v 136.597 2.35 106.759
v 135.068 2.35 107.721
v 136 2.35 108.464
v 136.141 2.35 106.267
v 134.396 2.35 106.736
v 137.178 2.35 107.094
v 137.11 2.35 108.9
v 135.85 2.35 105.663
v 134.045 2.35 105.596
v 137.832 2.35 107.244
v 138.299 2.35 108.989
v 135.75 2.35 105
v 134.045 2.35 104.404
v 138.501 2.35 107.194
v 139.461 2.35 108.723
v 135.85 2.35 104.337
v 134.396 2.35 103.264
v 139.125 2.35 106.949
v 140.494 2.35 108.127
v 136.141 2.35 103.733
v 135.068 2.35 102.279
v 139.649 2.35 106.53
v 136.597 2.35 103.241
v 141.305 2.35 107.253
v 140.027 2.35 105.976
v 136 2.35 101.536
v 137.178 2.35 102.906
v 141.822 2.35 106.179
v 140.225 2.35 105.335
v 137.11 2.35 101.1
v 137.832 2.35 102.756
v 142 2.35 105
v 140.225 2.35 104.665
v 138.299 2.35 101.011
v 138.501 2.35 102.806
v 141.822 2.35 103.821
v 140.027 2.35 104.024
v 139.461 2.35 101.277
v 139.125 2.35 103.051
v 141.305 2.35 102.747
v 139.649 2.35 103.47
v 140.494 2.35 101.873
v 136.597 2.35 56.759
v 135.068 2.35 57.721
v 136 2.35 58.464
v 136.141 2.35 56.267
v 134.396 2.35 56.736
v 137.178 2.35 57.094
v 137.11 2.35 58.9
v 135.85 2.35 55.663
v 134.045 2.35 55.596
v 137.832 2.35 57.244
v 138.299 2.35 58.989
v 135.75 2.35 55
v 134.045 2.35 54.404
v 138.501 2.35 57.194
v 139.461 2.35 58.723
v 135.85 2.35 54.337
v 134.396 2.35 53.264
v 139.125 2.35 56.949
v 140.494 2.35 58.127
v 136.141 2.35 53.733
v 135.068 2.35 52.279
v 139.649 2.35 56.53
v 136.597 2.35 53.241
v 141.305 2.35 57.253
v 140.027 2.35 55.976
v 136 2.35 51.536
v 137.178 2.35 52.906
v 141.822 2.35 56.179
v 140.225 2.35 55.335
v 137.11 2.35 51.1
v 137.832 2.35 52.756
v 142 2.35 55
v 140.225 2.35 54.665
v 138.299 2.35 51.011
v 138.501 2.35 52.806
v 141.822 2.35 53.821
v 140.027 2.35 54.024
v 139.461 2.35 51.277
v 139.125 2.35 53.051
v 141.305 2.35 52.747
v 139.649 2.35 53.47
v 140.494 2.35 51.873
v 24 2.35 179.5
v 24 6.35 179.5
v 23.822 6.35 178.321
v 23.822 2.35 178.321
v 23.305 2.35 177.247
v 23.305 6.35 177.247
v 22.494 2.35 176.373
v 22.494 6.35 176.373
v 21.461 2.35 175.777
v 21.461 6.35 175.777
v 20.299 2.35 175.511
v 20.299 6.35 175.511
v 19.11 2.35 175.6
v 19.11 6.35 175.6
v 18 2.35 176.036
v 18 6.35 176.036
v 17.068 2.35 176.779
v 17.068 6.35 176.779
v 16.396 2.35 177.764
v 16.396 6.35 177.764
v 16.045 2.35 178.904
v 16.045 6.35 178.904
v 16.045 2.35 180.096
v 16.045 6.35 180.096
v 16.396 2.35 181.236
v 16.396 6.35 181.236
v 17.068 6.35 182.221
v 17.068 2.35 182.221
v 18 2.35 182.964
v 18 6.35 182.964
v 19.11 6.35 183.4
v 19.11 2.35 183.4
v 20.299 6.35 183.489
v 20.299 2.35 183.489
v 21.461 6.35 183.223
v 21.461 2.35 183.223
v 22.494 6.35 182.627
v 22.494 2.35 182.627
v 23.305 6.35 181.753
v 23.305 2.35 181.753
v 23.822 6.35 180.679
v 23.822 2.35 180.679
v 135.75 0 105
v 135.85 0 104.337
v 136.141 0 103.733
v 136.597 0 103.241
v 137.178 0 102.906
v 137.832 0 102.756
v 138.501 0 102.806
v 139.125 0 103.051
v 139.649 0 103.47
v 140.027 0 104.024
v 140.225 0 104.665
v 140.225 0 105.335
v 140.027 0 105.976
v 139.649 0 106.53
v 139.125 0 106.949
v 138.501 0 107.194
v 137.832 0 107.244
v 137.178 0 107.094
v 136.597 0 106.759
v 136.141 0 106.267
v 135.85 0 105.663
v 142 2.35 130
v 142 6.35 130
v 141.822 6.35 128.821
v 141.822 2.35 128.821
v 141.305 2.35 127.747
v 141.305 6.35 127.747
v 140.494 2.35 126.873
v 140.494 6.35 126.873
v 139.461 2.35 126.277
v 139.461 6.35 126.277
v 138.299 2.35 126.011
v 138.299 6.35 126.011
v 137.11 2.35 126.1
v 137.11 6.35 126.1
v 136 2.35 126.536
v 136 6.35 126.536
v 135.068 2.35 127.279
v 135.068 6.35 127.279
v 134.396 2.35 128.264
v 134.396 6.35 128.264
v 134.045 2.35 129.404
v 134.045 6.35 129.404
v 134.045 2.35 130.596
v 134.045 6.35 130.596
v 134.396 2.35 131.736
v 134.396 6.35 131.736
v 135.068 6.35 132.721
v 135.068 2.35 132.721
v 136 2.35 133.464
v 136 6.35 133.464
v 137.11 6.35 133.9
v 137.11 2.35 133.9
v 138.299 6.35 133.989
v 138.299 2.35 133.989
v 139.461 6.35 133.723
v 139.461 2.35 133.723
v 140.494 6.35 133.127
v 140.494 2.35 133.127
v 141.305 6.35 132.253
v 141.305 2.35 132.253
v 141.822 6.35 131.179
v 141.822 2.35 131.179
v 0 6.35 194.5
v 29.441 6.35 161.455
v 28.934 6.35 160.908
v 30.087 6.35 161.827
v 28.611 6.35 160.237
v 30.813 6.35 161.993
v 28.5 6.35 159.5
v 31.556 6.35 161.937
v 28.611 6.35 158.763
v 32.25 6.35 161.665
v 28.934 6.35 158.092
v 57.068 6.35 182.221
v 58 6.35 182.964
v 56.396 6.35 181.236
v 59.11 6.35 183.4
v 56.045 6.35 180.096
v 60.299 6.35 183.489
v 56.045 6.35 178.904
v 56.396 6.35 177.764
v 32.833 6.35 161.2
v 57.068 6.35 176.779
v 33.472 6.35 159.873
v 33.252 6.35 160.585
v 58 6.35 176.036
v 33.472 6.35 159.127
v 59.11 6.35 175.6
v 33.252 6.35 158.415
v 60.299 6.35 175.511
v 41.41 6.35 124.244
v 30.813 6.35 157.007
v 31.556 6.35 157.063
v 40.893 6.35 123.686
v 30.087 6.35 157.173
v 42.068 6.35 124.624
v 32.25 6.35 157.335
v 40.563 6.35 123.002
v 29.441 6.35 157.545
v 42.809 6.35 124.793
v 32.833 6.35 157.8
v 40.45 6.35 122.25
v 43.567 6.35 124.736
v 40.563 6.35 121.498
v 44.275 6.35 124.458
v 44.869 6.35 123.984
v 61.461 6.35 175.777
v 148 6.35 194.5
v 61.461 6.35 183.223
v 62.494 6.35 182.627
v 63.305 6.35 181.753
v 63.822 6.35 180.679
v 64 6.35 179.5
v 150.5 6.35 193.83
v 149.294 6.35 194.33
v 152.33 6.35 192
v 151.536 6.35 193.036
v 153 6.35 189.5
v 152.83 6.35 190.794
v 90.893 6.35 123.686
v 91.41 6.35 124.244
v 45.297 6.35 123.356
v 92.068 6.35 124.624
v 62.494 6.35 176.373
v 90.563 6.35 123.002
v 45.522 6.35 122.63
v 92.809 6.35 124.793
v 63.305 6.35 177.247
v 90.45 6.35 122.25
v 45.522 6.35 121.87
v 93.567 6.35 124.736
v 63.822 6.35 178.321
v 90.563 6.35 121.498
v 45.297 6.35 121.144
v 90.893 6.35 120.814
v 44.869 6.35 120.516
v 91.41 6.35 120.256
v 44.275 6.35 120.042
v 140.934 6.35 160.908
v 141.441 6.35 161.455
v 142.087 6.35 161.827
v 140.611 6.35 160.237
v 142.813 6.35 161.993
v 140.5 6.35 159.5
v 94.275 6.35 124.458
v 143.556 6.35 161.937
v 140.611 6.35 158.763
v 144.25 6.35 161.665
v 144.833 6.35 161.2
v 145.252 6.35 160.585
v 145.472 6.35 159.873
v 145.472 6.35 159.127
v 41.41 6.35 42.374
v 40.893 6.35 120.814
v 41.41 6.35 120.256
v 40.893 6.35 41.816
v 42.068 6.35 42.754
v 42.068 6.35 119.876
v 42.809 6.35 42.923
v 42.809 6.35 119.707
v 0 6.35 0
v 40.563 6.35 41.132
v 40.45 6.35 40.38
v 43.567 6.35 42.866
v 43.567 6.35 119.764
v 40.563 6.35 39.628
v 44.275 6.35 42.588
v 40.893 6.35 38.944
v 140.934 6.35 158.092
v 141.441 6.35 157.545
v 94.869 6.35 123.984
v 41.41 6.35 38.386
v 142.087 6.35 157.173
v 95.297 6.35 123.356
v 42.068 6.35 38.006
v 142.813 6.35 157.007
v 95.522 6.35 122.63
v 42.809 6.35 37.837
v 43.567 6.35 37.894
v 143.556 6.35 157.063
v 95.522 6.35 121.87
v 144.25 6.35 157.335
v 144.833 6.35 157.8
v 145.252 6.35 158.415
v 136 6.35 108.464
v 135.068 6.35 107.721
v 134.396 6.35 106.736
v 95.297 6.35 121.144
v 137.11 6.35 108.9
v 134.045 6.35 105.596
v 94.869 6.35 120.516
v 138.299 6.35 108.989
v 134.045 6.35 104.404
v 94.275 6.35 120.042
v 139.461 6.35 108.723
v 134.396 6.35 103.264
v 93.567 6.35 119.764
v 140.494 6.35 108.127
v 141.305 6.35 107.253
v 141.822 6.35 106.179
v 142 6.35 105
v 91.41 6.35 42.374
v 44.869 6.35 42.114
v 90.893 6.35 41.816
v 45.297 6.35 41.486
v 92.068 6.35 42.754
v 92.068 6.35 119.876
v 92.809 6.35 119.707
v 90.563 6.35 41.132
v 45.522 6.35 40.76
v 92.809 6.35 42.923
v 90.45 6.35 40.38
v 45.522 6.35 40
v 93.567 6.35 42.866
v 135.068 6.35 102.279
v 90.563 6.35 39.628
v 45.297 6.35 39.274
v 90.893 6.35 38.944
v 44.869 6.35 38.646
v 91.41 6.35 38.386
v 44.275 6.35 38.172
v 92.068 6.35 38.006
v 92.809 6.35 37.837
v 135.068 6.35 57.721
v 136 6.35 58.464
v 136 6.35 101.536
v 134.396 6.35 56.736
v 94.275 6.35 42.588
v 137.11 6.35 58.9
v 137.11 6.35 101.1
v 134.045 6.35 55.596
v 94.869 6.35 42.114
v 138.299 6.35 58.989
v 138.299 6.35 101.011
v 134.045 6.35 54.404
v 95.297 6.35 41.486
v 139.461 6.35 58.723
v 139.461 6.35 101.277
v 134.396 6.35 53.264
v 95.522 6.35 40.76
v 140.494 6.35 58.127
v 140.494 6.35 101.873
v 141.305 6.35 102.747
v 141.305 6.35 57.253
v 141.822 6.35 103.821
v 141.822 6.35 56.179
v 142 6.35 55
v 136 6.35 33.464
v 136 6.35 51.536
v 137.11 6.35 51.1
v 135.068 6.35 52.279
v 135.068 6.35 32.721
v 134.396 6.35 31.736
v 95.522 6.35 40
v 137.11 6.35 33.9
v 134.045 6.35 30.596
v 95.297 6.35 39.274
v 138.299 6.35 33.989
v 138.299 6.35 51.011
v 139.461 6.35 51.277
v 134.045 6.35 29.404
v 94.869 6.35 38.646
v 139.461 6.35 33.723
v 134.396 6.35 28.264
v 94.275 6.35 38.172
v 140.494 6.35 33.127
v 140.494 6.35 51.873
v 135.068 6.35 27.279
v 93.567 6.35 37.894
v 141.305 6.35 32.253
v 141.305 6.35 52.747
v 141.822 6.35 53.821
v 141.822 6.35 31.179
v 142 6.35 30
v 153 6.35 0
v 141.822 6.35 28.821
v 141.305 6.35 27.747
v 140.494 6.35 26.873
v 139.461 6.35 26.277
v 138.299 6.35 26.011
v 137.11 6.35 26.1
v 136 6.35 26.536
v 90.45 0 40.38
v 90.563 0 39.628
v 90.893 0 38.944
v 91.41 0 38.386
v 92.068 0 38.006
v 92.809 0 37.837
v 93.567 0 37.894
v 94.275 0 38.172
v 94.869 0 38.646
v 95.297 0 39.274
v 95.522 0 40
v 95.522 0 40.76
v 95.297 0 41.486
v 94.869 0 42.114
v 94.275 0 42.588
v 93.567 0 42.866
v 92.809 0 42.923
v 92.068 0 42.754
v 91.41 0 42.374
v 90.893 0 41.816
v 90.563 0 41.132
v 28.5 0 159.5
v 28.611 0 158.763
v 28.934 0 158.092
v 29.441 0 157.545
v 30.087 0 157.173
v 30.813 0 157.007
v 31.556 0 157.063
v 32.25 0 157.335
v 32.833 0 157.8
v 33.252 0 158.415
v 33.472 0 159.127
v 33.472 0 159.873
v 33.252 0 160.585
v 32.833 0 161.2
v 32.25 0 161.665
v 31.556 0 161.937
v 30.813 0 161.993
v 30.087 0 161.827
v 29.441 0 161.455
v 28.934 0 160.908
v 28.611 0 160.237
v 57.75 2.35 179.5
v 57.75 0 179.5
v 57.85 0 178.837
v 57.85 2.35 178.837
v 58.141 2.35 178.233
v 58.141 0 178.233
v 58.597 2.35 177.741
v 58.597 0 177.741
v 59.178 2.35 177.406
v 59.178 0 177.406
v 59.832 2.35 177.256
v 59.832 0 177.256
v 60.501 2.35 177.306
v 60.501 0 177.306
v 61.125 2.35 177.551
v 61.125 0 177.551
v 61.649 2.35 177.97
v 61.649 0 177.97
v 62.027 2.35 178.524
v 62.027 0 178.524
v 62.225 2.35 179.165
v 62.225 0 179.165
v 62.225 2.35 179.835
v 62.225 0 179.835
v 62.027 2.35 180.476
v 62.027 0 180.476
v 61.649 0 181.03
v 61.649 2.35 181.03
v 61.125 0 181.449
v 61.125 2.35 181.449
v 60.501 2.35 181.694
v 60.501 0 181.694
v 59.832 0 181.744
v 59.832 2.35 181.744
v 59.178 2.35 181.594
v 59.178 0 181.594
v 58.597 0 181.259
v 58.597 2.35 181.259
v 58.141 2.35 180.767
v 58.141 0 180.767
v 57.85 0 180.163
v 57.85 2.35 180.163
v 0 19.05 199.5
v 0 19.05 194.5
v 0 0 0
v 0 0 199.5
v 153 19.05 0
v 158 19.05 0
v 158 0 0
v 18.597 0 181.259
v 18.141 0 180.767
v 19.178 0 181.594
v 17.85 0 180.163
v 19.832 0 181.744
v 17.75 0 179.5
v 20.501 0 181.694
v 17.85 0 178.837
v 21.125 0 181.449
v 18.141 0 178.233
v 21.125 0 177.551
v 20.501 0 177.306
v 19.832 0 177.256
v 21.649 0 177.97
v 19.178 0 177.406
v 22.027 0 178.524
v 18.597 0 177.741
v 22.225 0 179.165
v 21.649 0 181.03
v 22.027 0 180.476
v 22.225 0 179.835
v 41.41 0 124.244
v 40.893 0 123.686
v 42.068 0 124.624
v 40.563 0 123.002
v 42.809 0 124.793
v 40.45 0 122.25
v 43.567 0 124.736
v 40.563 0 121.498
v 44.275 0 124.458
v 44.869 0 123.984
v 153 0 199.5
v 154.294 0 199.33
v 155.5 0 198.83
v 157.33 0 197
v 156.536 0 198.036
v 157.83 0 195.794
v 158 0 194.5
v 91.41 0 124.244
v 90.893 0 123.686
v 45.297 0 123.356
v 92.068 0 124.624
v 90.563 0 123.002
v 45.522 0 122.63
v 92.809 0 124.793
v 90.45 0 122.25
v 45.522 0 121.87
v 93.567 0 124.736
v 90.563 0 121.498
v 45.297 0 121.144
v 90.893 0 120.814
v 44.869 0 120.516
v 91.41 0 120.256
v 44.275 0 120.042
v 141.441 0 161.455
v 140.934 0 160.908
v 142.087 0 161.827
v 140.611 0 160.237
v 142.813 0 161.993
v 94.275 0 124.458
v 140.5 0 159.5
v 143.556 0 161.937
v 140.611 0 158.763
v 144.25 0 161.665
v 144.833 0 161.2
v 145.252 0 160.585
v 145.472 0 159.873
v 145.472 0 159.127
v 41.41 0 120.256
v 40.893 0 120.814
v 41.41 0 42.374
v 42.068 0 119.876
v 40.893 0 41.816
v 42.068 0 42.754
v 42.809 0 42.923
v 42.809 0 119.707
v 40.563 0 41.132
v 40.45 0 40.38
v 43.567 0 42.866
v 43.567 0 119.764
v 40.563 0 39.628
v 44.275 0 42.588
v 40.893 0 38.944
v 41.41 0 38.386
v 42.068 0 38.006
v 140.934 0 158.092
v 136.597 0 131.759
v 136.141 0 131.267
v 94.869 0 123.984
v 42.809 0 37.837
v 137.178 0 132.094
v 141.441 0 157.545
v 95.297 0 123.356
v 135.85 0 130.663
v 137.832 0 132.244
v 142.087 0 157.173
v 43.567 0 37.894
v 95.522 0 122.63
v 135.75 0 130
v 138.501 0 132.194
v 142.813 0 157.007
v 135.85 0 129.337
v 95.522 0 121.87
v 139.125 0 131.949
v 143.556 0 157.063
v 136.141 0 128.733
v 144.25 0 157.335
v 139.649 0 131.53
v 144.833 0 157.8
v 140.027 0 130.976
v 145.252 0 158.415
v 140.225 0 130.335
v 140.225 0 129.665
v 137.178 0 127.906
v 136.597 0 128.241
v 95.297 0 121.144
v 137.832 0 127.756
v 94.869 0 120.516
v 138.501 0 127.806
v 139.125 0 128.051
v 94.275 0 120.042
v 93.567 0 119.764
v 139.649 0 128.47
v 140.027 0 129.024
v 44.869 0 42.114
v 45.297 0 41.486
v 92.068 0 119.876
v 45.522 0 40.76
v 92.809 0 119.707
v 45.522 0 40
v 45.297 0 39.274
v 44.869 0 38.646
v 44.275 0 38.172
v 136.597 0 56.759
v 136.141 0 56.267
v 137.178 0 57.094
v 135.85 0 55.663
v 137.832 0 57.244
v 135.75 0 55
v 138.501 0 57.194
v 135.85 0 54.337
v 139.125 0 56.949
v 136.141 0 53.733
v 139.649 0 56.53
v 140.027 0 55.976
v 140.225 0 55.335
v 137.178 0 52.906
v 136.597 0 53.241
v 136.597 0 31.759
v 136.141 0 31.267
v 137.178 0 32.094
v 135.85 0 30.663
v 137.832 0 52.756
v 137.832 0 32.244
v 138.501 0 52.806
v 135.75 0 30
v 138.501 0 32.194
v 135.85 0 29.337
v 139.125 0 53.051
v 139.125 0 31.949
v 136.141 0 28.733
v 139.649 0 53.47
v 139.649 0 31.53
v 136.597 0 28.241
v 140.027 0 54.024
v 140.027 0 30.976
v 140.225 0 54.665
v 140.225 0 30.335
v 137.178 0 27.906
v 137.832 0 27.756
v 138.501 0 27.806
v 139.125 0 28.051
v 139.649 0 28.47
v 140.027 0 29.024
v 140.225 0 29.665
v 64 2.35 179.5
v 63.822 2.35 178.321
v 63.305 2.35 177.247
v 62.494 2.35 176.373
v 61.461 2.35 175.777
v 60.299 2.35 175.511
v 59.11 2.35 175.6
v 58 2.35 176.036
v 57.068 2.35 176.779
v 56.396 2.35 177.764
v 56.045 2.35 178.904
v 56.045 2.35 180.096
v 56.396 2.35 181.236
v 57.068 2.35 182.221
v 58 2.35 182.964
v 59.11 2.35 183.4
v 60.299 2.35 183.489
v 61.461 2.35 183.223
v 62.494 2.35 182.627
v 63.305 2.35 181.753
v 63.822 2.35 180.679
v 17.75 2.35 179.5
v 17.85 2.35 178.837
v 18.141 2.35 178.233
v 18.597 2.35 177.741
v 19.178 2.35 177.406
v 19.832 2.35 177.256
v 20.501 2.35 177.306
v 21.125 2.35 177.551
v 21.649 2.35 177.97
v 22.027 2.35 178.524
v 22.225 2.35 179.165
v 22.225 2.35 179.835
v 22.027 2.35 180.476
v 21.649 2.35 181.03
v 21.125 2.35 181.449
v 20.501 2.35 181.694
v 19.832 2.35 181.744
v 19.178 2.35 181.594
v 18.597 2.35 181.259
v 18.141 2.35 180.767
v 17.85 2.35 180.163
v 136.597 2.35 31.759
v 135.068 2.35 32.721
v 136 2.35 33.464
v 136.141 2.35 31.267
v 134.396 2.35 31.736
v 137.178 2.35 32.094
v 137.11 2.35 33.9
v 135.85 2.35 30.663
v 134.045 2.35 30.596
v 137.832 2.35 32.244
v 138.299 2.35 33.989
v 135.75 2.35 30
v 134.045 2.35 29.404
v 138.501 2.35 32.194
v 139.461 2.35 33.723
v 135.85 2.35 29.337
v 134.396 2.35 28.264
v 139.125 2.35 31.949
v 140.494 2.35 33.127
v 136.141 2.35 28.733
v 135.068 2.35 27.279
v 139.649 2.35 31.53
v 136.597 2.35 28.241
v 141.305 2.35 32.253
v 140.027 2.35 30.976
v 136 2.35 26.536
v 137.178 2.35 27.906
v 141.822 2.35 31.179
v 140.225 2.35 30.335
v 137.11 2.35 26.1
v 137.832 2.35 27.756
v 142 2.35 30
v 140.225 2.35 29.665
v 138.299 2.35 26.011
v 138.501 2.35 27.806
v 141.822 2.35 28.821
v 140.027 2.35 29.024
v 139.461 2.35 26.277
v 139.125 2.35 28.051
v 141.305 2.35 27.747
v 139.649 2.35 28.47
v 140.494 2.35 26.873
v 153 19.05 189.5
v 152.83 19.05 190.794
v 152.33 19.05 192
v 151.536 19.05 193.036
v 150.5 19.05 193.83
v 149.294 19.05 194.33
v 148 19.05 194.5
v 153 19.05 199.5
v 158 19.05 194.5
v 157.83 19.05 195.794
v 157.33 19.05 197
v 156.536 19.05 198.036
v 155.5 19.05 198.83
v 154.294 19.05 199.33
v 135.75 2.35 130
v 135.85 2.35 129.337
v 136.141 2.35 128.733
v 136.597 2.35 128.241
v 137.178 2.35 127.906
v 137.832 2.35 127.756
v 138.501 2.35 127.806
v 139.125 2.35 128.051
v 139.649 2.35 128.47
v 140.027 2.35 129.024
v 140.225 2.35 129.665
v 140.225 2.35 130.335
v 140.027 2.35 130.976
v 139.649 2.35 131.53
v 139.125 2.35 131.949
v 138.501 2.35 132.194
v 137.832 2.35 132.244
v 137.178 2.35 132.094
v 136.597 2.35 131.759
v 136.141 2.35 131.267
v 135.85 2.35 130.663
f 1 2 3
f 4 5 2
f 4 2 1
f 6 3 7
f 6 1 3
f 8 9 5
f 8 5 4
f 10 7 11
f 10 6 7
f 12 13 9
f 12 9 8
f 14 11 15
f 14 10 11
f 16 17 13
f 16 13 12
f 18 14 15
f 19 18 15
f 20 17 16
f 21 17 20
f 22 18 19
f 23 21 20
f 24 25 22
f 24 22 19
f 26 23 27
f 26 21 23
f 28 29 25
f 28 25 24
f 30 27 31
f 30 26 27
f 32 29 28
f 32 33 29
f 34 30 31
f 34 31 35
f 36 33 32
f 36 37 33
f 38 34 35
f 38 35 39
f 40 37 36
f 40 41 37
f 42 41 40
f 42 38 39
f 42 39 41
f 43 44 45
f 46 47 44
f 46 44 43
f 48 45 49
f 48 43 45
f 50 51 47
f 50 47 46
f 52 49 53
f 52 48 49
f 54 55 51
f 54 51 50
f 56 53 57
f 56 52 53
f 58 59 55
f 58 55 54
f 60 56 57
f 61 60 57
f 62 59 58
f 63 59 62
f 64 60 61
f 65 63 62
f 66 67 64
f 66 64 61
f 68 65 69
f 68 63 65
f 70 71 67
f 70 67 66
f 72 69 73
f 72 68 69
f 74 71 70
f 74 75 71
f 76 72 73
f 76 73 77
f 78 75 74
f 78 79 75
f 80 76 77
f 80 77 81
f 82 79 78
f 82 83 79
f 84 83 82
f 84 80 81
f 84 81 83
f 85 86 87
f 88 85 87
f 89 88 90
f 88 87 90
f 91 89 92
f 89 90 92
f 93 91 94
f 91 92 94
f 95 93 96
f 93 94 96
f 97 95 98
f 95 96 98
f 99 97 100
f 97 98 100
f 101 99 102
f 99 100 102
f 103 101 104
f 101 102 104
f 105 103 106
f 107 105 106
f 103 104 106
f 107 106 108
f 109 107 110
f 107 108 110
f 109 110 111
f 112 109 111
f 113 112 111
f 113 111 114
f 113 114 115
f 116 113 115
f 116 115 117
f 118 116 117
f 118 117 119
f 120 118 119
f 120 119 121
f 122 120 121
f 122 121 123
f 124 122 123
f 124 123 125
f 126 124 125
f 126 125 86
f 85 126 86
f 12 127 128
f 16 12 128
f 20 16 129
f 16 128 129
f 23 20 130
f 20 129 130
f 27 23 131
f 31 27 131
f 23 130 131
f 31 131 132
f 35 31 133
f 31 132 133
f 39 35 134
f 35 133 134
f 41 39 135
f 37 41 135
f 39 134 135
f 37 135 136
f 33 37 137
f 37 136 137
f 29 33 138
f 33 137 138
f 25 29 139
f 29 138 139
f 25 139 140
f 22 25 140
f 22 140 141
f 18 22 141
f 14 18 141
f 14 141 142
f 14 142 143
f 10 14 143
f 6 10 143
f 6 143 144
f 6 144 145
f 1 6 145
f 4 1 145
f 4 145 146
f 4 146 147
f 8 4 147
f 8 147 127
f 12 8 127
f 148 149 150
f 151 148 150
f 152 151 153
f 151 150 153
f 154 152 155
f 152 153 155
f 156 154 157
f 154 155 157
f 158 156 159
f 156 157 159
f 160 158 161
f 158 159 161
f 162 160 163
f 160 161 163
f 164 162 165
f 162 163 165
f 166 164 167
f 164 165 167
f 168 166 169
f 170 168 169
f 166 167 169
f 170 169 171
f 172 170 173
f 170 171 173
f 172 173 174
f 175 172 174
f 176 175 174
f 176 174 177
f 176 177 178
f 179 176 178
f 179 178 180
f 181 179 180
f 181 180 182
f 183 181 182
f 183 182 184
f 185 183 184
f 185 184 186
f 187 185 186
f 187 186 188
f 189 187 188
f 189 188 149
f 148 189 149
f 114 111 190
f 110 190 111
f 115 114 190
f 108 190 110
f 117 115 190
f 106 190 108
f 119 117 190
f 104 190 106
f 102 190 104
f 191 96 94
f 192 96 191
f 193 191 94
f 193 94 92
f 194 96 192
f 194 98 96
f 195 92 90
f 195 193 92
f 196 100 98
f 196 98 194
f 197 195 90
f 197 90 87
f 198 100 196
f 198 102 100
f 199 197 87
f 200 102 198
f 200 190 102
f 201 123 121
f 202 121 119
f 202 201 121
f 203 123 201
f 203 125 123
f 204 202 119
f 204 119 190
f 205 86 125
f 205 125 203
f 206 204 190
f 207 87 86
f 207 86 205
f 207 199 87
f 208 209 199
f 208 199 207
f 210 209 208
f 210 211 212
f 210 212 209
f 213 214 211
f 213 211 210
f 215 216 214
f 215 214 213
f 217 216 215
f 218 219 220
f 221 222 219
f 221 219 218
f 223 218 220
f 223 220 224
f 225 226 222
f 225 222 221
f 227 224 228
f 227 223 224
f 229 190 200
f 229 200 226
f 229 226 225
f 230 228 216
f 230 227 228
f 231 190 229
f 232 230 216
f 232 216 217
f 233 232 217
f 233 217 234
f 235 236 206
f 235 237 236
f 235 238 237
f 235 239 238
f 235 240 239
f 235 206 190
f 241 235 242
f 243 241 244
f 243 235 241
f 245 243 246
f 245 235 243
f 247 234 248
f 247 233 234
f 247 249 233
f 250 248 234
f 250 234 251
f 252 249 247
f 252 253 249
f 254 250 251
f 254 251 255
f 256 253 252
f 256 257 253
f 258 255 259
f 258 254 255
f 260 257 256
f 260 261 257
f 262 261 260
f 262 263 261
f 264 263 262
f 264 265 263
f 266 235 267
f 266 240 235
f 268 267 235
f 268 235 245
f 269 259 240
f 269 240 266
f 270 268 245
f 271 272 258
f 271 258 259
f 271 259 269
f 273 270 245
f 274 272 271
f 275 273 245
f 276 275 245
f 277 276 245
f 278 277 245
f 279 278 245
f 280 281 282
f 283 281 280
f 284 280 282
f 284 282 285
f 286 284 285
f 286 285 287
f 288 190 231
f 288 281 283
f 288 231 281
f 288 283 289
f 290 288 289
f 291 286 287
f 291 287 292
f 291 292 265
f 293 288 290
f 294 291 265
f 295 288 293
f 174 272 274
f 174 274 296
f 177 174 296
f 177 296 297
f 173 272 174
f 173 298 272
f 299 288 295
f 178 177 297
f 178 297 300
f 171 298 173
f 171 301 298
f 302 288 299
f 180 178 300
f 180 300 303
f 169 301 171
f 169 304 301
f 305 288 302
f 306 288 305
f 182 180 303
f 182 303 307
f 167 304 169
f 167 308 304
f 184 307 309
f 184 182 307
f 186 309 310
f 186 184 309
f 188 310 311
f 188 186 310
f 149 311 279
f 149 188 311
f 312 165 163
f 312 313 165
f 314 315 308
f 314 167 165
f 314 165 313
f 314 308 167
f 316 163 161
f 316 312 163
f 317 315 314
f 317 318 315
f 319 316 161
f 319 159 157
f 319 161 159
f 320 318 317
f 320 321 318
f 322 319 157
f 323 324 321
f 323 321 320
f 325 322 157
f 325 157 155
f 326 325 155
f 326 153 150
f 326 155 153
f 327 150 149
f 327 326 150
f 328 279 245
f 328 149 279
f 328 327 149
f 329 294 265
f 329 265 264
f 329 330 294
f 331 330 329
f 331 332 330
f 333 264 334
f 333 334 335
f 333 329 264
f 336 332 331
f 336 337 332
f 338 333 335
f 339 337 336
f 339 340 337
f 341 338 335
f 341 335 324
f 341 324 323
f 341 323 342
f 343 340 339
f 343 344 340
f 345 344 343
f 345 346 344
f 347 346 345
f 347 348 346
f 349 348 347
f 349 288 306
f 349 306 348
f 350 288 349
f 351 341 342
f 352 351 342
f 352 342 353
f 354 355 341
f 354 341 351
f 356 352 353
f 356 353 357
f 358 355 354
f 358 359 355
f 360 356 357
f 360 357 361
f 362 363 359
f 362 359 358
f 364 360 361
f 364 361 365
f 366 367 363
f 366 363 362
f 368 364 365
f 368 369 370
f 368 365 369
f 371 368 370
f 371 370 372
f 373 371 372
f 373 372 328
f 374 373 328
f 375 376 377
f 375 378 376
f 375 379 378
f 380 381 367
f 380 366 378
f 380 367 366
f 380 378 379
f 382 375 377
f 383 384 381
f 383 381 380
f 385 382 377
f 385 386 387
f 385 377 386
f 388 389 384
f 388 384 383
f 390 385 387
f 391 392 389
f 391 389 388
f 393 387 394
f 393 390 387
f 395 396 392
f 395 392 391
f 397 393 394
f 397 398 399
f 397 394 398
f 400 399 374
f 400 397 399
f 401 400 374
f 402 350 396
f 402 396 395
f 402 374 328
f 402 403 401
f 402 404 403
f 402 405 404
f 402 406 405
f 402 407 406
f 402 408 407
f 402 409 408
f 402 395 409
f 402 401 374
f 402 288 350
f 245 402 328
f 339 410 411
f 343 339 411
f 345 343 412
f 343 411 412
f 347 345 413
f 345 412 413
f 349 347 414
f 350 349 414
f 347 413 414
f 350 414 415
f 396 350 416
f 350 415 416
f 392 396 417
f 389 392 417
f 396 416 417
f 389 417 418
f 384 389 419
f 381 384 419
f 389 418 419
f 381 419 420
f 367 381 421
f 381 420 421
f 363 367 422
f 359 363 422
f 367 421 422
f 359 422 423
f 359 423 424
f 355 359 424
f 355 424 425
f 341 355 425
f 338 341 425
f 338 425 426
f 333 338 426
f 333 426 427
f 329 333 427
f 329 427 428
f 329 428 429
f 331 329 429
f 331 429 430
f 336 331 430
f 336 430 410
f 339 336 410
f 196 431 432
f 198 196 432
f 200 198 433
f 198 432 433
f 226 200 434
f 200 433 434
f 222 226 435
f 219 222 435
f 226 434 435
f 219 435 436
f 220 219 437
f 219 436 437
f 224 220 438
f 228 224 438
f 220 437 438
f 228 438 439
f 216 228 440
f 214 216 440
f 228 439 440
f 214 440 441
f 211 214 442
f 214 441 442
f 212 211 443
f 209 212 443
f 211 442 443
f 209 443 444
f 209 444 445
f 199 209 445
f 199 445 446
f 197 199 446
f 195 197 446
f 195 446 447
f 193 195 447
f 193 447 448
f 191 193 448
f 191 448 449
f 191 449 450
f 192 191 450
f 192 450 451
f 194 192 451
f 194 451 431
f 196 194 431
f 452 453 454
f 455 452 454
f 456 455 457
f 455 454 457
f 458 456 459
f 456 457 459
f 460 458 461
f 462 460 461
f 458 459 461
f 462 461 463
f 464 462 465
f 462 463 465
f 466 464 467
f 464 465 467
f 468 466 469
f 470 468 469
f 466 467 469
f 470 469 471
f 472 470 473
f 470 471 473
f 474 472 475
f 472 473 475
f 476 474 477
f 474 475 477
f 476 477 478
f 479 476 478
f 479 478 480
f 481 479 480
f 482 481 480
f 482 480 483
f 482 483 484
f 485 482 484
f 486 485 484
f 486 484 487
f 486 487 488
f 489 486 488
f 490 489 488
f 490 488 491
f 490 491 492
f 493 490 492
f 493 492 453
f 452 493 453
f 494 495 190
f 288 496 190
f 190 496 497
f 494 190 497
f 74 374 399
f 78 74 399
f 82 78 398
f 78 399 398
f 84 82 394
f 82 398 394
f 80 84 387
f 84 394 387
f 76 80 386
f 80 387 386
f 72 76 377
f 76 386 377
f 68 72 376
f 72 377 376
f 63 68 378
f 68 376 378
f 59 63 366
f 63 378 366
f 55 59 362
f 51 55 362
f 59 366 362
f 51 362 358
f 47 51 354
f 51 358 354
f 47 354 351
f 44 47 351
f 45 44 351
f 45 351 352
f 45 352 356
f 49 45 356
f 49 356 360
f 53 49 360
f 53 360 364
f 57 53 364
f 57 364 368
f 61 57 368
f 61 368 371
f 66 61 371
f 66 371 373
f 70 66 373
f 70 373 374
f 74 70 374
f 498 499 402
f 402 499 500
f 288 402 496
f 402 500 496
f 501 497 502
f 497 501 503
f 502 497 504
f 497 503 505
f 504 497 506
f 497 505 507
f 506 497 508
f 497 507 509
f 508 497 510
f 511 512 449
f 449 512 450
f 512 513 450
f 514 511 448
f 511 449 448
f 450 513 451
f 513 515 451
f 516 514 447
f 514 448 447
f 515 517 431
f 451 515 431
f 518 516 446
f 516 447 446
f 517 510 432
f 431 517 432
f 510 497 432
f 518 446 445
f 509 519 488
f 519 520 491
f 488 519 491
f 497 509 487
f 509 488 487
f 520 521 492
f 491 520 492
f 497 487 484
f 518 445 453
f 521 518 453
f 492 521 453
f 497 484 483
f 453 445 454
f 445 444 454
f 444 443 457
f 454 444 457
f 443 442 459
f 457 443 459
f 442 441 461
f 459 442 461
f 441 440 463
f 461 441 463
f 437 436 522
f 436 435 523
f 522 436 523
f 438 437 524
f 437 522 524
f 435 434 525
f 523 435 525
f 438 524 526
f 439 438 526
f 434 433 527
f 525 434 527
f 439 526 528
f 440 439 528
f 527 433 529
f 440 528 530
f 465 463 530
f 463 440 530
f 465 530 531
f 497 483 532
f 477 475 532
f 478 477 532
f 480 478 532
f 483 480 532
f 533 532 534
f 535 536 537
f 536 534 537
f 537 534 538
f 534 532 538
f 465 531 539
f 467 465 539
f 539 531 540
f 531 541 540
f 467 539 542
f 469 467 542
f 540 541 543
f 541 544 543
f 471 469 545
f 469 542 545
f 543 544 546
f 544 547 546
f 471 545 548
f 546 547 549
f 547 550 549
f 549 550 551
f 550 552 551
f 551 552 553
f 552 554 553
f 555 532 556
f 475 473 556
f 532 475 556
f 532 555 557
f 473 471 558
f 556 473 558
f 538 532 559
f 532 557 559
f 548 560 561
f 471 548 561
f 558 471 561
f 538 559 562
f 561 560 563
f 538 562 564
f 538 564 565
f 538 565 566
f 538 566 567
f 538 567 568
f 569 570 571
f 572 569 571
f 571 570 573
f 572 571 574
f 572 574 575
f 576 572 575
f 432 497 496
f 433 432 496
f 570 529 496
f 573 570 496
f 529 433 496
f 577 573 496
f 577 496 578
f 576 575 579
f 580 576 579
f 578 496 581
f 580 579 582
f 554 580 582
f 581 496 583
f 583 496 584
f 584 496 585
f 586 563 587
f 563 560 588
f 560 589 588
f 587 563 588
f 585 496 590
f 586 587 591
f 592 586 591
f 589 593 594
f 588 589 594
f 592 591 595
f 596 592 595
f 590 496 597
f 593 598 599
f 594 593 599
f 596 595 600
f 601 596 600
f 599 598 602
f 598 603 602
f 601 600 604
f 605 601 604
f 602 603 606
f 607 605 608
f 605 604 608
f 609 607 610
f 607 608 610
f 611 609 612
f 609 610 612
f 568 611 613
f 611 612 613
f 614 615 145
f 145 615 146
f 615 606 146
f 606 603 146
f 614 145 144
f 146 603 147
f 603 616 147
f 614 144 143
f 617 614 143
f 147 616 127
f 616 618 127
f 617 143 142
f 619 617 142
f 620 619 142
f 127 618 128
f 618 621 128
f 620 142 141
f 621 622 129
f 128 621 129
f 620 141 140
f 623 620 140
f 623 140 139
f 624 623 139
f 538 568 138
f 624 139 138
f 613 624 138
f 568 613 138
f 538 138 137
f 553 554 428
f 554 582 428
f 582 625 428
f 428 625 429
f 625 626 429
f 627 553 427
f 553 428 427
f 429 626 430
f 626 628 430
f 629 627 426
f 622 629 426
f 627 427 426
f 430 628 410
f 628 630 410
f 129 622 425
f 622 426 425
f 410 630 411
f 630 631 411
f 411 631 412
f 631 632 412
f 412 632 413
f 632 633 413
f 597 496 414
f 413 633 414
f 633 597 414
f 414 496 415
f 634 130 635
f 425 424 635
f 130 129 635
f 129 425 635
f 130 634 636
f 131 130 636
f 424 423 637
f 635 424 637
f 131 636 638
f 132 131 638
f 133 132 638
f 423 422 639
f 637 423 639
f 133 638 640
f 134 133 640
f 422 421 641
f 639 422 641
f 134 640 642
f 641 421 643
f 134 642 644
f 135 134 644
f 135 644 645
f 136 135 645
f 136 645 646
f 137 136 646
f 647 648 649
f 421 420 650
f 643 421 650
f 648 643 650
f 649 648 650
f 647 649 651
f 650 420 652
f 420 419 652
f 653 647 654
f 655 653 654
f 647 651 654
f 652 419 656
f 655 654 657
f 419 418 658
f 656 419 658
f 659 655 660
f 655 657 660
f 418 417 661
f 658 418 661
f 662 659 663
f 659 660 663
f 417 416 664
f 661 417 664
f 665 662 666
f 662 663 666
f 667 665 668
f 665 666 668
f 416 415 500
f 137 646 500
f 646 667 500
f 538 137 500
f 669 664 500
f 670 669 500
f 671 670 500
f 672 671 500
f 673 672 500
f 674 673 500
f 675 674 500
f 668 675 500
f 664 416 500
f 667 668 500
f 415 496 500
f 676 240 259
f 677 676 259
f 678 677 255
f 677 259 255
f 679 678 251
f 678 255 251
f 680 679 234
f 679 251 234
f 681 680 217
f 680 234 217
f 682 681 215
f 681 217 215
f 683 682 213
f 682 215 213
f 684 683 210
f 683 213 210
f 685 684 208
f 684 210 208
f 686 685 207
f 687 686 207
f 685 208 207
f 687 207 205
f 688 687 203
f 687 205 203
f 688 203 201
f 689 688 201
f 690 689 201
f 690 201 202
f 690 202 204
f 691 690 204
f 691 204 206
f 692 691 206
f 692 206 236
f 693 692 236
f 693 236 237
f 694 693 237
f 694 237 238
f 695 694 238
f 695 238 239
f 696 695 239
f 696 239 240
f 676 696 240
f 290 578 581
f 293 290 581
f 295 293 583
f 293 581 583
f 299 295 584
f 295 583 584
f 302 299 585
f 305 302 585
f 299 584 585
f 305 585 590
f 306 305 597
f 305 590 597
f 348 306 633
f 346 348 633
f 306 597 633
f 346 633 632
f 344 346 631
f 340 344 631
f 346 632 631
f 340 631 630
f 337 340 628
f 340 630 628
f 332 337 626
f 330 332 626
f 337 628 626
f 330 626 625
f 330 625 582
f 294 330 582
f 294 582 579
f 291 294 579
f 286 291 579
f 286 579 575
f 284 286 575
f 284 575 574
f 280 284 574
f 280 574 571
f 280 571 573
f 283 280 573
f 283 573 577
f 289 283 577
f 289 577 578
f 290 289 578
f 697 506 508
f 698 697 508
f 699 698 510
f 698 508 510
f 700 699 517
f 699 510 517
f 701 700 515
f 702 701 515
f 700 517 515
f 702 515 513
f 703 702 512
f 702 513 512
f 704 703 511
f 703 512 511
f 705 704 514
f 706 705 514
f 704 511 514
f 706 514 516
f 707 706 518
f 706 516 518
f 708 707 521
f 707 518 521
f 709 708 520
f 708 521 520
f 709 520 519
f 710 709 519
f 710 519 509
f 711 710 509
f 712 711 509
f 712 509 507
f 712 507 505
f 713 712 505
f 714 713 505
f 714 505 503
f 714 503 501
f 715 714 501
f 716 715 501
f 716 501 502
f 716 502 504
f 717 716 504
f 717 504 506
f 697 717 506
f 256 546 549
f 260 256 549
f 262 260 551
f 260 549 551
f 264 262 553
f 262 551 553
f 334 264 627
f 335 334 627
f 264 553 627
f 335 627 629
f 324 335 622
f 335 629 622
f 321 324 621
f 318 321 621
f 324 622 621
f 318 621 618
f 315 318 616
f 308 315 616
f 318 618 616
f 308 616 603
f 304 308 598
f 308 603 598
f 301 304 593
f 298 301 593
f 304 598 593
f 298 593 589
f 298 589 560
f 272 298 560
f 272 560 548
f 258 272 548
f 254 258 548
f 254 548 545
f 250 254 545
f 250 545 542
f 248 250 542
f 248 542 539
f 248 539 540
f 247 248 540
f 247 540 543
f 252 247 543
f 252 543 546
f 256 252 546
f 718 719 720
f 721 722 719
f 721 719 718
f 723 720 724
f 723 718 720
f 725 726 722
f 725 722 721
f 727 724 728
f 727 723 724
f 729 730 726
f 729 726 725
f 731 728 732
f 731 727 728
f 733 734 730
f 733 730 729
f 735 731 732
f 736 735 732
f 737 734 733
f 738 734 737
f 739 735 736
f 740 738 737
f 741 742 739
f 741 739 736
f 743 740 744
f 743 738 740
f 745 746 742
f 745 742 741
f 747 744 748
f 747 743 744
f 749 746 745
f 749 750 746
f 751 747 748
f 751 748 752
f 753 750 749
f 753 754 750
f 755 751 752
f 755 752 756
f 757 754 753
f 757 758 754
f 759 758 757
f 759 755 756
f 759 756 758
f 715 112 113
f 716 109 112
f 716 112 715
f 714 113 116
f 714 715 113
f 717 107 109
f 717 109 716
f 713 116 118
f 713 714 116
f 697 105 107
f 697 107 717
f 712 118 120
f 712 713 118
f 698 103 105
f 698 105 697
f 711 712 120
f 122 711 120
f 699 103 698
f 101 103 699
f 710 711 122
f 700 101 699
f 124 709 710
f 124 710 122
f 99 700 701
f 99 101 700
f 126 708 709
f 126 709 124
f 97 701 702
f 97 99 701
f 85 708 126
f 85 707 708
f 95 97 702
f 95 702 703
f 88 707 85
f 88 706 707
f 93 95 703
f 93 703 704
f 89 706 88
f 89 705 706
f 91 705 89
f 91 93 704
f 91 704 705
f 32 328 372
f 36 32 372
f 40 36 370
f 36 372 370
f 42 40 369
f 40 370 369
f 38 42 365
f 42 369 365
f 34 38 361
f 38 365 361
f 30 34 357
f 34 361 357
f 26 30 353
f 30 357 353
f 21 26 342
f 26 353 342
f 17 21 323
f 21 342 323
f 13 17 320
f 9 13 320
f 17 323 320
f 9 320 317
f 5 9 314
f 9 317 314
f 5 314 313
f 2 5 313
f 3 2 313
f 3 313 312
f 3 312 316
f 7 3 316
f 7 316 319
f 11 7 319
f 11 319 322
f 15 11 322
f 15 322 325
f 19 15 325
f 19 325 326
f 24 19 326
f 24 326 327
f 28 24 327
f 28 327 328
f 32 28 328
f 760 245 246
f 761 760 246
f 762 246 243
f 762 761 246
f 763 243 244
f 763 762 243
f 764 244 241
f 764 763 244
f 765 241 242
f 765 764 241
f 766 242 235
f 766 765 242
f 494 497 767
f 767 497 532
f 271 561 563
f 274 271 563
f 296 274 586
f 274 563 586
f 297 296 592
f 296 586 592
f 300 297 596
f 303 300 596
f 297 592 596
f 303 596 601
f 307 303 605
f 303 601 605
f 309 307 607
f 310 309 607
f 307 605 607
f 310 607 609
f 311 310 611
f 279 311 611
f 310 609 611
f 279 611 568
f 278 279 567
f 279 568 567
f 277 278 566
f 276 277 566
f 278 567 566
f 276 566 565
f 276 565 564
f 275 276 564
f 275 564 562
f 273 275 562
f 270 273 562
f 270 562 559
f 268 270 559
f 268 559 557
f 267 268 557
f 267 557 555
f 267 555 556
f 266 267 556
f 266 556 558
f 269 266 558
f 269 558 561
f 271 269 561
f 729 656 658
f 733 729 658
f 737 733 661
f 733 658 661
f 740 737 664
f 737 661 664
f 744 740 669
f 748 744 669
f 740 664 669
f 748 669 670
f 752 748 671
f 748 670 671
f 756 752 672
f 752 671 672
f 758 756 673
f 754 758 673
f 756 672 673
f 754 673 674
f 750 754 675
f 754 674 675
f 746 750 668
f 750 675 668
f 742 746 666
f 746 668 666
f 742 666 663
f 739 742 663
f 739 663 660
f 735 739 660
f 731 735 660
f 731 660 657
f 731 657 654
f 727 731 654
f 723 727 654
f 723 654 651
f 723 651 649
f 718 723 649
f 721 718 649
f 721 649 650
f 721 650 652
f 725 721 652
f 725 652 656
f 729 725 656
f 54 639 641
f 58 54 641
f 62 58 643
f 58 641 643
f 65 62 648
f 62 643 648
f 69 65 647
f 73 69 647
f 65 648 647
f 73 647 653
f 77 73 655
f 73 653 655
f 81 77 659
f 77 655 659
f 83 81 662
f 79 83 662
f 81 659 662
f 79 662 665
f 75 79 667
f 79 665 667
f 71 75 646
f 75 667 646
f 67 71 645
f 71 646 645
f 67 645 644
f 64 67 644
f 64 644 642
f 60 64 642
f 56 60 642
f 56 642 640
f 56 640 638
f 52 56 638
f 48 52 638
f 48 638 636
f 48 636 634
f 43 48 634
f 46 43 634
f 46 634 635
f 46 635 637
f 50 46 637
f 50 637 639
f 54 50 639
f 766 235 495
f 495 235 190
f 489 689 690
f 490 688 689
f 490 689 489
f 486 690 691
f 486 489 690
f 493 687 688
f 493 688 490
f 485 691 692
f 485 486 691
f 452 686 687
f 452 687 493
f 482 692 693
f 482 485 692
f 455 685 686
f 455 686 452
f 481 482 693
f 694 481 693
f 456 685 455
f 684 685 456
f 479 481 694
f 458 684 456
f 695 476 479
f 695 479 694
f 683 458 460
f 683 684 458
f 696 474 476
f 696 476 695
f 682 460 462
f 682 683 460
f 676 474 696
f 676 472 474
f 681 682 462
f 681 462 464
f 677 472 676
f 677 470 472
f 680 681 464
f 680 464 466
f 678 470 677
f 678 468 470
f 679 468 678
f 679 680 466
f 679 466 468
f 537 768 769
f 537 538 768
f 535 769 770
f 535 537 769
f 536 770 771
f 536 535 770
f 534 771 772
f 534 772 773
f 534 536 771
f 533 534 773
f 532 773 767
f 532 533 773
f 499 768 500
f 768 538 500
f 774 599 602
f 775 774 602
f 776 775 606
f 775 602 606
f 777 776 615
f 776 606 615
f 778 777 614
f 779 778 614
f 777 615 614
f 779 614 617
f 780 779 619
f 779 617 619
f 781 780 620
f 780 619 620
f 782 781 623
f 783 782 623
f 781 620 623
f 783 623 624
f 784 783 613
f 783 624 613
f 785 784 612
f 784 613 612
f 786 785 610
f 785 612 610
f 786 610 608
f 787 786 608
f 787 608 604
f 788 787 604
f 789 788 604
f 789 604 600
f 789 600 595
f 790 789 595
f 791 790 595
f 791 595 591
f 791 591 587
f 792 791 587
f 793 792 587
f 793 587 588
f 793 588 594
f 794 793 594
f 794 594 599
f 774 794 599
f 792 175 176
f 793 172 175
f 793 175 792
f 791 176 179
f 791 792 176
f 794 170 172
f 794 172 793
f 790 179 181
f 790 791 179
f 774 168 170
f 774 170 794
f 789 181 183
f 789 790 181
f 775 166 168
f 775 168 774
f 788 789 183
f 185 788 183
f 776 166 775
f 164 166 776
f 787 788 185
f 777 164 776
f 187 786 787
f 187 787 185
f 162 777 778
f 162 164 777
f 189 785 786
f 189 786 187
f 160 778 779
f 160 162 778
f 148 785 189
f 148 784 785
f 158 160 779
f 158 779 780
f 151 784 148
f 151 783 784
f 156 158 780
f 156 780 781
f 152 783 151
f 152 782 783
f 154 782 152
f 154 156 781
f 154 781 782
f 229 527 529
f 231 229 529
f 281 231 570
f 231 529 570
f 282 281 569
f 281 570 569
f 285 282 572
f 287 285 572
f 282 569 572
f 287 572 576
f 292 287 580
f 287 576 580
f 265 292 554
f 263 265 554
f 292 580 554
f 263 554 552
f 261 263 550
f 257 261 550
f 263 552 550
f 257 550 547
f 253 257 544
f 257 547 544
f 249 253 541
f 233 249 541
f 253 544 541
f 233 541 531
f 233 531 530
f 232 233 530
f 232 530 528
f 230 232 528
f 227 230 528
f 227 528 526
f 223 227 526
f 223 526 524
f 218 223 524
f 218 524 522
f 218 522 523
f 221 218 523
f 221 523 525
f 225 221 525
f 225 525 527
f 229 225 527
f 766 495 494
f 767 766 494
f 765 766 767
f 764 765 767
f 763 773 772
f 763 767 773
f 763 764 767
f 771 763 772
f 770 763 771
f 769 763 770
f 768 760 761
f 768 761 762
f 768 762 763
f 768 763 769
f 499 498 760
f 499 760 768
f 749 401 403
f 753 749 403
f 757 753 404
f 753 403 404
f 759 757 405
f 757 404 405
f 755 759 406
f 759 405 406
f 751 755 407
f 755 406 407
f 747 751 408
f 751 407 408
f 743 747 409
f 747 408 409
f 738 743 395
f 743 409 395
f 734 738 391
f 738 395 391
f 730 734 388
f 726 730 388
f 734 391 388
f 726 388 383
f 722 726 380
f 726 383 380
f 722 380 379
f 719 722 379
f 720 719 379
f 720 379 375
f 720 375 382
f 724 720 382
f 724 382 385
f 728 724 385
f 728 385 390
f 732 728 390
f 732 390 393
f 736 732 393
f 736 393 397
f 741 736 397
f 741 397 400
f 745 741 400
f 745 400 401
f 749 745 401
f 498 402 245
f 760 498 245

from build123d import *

# Parameters (mm, degrees)
SKETCH1_W                      = 158
SKETCH1_H                      = 199.5
BOSS_EXTRUDE1_DEPTH            = 6.35
BOSS_EXTRUDE2_DEPTH            = 12.7
CBORE_FOR_M4_SHCS1_D           = 4.5
CBORE_FOR_M4_SHCS1_DEPTH       = 6.35
CBORE_FOR_M4_SHCS1_CBORE_D     = 8
CBORE_FOR_M4_SHCS1_CBORE_DEPTH = 4
F_5_1_5_1_DIAMETER_HOLE1_D     = 5.1
F_5_1_5_1_DIAMETER_HOLE1_DEPTH = 6.35
FILLET2_R                      = 5
FILLET3_R                      = 5
F_5_0_5_DIAMETER_HOLE1_D       = 5
F_5_0_5_DIAMETER_HOLE1_DEPTH   = 6.35


with BuildPart() as part:
    # Sketch1 → Boss-Extrude1 (new body)
    with BuildSketch(Plane(origin=(0, 0, 0), x_dir=(1, 0, 0), z_dir=(0, 1, 0))):
        with Locations((79, -99.75)):
            Rectangle(SKETCH1_W, SKETCH1_H)
    extrude(amount=BOSS_EXTRUDE1_DEPTH)

    # Sketch3 → Boss-Extrude2 (add)
    with BuildSketch(Plane(origin=(0, 6.35, 0), x_dir=(1, 0, 0), z_dir=(0, 1, 0))):
        Polygon((158, -199.5), (158, 0), (153, 0), (153, -194.5), (0, -194.5), (0, -199.5), align=None)
    extrude(amount=BOSS_EXTRUDE2_DEPTH)

    # CBORE for M4 SHCS1
    with Locations(Plane(origin=(0, 6.35, 0), x_dir=(1, 0, 0), z_dir=(0, 1, 0))):
        with Locations((138, -55), (20, -179.5), (60, -179.5), (138, -130), (138, -105), (138, -30)):
            CounterBoreHole(CBORE_FOR_M4_SHCS1_D / 2, CBORE_FOR_M4_SHCS1_CBORE_D / 2, CBORE_FOR_M4_SHCS1_CBORE_DEPTH, depth=CBORE_FOR_M4_SHCS1_DEPTH)

    # Ø5.1 (5.1) Diameter Hole1
    with Locations(Plane(origin=(0, 6.35, 0), x_dir=(1, 0, 0), z_dir=(0, 1, 0))):
        with Locations((43, -40.38), (43, -122.25), (93, -122.25), (93, -40.38)):
            Hole(F_5_1_5_1_DIAMETER_HOLE1_D / 2, depth=F_5_1_5_1_DIAMETER_HOLE1_DEPTH)

    # Fillet2
    fillet2_edges = [part.edges().sort_by_distance(p)[0] for p in [
        (158, 9.525, 199.5),
    ]]
    fillet(fillet2_edges, radius=FILLET2_R)

    # Fillet3
    fillet3_edges = [part.edges().sort_by_distance(p)[0] for p in [
        (153, 12.7, 194.5),
    ]]
    fillet(fillet3_edges, radius=FILLET3_R)

    # Ø5.0 (5) Diameter Hole1
    with Locations(Plane(origin=(0, 6.35, 0), x_dir=(1, 0, 0), z_dir=(0, 1, 0))):
        with Locations((31, -159.5), (143, -159.5)):
            Hole(F_5_0_5_DIAMETER_HOLE1_D / 2, depth=F_5_0_5_DIAMETER_HOLE1_DEPTH)


solid = part.part
